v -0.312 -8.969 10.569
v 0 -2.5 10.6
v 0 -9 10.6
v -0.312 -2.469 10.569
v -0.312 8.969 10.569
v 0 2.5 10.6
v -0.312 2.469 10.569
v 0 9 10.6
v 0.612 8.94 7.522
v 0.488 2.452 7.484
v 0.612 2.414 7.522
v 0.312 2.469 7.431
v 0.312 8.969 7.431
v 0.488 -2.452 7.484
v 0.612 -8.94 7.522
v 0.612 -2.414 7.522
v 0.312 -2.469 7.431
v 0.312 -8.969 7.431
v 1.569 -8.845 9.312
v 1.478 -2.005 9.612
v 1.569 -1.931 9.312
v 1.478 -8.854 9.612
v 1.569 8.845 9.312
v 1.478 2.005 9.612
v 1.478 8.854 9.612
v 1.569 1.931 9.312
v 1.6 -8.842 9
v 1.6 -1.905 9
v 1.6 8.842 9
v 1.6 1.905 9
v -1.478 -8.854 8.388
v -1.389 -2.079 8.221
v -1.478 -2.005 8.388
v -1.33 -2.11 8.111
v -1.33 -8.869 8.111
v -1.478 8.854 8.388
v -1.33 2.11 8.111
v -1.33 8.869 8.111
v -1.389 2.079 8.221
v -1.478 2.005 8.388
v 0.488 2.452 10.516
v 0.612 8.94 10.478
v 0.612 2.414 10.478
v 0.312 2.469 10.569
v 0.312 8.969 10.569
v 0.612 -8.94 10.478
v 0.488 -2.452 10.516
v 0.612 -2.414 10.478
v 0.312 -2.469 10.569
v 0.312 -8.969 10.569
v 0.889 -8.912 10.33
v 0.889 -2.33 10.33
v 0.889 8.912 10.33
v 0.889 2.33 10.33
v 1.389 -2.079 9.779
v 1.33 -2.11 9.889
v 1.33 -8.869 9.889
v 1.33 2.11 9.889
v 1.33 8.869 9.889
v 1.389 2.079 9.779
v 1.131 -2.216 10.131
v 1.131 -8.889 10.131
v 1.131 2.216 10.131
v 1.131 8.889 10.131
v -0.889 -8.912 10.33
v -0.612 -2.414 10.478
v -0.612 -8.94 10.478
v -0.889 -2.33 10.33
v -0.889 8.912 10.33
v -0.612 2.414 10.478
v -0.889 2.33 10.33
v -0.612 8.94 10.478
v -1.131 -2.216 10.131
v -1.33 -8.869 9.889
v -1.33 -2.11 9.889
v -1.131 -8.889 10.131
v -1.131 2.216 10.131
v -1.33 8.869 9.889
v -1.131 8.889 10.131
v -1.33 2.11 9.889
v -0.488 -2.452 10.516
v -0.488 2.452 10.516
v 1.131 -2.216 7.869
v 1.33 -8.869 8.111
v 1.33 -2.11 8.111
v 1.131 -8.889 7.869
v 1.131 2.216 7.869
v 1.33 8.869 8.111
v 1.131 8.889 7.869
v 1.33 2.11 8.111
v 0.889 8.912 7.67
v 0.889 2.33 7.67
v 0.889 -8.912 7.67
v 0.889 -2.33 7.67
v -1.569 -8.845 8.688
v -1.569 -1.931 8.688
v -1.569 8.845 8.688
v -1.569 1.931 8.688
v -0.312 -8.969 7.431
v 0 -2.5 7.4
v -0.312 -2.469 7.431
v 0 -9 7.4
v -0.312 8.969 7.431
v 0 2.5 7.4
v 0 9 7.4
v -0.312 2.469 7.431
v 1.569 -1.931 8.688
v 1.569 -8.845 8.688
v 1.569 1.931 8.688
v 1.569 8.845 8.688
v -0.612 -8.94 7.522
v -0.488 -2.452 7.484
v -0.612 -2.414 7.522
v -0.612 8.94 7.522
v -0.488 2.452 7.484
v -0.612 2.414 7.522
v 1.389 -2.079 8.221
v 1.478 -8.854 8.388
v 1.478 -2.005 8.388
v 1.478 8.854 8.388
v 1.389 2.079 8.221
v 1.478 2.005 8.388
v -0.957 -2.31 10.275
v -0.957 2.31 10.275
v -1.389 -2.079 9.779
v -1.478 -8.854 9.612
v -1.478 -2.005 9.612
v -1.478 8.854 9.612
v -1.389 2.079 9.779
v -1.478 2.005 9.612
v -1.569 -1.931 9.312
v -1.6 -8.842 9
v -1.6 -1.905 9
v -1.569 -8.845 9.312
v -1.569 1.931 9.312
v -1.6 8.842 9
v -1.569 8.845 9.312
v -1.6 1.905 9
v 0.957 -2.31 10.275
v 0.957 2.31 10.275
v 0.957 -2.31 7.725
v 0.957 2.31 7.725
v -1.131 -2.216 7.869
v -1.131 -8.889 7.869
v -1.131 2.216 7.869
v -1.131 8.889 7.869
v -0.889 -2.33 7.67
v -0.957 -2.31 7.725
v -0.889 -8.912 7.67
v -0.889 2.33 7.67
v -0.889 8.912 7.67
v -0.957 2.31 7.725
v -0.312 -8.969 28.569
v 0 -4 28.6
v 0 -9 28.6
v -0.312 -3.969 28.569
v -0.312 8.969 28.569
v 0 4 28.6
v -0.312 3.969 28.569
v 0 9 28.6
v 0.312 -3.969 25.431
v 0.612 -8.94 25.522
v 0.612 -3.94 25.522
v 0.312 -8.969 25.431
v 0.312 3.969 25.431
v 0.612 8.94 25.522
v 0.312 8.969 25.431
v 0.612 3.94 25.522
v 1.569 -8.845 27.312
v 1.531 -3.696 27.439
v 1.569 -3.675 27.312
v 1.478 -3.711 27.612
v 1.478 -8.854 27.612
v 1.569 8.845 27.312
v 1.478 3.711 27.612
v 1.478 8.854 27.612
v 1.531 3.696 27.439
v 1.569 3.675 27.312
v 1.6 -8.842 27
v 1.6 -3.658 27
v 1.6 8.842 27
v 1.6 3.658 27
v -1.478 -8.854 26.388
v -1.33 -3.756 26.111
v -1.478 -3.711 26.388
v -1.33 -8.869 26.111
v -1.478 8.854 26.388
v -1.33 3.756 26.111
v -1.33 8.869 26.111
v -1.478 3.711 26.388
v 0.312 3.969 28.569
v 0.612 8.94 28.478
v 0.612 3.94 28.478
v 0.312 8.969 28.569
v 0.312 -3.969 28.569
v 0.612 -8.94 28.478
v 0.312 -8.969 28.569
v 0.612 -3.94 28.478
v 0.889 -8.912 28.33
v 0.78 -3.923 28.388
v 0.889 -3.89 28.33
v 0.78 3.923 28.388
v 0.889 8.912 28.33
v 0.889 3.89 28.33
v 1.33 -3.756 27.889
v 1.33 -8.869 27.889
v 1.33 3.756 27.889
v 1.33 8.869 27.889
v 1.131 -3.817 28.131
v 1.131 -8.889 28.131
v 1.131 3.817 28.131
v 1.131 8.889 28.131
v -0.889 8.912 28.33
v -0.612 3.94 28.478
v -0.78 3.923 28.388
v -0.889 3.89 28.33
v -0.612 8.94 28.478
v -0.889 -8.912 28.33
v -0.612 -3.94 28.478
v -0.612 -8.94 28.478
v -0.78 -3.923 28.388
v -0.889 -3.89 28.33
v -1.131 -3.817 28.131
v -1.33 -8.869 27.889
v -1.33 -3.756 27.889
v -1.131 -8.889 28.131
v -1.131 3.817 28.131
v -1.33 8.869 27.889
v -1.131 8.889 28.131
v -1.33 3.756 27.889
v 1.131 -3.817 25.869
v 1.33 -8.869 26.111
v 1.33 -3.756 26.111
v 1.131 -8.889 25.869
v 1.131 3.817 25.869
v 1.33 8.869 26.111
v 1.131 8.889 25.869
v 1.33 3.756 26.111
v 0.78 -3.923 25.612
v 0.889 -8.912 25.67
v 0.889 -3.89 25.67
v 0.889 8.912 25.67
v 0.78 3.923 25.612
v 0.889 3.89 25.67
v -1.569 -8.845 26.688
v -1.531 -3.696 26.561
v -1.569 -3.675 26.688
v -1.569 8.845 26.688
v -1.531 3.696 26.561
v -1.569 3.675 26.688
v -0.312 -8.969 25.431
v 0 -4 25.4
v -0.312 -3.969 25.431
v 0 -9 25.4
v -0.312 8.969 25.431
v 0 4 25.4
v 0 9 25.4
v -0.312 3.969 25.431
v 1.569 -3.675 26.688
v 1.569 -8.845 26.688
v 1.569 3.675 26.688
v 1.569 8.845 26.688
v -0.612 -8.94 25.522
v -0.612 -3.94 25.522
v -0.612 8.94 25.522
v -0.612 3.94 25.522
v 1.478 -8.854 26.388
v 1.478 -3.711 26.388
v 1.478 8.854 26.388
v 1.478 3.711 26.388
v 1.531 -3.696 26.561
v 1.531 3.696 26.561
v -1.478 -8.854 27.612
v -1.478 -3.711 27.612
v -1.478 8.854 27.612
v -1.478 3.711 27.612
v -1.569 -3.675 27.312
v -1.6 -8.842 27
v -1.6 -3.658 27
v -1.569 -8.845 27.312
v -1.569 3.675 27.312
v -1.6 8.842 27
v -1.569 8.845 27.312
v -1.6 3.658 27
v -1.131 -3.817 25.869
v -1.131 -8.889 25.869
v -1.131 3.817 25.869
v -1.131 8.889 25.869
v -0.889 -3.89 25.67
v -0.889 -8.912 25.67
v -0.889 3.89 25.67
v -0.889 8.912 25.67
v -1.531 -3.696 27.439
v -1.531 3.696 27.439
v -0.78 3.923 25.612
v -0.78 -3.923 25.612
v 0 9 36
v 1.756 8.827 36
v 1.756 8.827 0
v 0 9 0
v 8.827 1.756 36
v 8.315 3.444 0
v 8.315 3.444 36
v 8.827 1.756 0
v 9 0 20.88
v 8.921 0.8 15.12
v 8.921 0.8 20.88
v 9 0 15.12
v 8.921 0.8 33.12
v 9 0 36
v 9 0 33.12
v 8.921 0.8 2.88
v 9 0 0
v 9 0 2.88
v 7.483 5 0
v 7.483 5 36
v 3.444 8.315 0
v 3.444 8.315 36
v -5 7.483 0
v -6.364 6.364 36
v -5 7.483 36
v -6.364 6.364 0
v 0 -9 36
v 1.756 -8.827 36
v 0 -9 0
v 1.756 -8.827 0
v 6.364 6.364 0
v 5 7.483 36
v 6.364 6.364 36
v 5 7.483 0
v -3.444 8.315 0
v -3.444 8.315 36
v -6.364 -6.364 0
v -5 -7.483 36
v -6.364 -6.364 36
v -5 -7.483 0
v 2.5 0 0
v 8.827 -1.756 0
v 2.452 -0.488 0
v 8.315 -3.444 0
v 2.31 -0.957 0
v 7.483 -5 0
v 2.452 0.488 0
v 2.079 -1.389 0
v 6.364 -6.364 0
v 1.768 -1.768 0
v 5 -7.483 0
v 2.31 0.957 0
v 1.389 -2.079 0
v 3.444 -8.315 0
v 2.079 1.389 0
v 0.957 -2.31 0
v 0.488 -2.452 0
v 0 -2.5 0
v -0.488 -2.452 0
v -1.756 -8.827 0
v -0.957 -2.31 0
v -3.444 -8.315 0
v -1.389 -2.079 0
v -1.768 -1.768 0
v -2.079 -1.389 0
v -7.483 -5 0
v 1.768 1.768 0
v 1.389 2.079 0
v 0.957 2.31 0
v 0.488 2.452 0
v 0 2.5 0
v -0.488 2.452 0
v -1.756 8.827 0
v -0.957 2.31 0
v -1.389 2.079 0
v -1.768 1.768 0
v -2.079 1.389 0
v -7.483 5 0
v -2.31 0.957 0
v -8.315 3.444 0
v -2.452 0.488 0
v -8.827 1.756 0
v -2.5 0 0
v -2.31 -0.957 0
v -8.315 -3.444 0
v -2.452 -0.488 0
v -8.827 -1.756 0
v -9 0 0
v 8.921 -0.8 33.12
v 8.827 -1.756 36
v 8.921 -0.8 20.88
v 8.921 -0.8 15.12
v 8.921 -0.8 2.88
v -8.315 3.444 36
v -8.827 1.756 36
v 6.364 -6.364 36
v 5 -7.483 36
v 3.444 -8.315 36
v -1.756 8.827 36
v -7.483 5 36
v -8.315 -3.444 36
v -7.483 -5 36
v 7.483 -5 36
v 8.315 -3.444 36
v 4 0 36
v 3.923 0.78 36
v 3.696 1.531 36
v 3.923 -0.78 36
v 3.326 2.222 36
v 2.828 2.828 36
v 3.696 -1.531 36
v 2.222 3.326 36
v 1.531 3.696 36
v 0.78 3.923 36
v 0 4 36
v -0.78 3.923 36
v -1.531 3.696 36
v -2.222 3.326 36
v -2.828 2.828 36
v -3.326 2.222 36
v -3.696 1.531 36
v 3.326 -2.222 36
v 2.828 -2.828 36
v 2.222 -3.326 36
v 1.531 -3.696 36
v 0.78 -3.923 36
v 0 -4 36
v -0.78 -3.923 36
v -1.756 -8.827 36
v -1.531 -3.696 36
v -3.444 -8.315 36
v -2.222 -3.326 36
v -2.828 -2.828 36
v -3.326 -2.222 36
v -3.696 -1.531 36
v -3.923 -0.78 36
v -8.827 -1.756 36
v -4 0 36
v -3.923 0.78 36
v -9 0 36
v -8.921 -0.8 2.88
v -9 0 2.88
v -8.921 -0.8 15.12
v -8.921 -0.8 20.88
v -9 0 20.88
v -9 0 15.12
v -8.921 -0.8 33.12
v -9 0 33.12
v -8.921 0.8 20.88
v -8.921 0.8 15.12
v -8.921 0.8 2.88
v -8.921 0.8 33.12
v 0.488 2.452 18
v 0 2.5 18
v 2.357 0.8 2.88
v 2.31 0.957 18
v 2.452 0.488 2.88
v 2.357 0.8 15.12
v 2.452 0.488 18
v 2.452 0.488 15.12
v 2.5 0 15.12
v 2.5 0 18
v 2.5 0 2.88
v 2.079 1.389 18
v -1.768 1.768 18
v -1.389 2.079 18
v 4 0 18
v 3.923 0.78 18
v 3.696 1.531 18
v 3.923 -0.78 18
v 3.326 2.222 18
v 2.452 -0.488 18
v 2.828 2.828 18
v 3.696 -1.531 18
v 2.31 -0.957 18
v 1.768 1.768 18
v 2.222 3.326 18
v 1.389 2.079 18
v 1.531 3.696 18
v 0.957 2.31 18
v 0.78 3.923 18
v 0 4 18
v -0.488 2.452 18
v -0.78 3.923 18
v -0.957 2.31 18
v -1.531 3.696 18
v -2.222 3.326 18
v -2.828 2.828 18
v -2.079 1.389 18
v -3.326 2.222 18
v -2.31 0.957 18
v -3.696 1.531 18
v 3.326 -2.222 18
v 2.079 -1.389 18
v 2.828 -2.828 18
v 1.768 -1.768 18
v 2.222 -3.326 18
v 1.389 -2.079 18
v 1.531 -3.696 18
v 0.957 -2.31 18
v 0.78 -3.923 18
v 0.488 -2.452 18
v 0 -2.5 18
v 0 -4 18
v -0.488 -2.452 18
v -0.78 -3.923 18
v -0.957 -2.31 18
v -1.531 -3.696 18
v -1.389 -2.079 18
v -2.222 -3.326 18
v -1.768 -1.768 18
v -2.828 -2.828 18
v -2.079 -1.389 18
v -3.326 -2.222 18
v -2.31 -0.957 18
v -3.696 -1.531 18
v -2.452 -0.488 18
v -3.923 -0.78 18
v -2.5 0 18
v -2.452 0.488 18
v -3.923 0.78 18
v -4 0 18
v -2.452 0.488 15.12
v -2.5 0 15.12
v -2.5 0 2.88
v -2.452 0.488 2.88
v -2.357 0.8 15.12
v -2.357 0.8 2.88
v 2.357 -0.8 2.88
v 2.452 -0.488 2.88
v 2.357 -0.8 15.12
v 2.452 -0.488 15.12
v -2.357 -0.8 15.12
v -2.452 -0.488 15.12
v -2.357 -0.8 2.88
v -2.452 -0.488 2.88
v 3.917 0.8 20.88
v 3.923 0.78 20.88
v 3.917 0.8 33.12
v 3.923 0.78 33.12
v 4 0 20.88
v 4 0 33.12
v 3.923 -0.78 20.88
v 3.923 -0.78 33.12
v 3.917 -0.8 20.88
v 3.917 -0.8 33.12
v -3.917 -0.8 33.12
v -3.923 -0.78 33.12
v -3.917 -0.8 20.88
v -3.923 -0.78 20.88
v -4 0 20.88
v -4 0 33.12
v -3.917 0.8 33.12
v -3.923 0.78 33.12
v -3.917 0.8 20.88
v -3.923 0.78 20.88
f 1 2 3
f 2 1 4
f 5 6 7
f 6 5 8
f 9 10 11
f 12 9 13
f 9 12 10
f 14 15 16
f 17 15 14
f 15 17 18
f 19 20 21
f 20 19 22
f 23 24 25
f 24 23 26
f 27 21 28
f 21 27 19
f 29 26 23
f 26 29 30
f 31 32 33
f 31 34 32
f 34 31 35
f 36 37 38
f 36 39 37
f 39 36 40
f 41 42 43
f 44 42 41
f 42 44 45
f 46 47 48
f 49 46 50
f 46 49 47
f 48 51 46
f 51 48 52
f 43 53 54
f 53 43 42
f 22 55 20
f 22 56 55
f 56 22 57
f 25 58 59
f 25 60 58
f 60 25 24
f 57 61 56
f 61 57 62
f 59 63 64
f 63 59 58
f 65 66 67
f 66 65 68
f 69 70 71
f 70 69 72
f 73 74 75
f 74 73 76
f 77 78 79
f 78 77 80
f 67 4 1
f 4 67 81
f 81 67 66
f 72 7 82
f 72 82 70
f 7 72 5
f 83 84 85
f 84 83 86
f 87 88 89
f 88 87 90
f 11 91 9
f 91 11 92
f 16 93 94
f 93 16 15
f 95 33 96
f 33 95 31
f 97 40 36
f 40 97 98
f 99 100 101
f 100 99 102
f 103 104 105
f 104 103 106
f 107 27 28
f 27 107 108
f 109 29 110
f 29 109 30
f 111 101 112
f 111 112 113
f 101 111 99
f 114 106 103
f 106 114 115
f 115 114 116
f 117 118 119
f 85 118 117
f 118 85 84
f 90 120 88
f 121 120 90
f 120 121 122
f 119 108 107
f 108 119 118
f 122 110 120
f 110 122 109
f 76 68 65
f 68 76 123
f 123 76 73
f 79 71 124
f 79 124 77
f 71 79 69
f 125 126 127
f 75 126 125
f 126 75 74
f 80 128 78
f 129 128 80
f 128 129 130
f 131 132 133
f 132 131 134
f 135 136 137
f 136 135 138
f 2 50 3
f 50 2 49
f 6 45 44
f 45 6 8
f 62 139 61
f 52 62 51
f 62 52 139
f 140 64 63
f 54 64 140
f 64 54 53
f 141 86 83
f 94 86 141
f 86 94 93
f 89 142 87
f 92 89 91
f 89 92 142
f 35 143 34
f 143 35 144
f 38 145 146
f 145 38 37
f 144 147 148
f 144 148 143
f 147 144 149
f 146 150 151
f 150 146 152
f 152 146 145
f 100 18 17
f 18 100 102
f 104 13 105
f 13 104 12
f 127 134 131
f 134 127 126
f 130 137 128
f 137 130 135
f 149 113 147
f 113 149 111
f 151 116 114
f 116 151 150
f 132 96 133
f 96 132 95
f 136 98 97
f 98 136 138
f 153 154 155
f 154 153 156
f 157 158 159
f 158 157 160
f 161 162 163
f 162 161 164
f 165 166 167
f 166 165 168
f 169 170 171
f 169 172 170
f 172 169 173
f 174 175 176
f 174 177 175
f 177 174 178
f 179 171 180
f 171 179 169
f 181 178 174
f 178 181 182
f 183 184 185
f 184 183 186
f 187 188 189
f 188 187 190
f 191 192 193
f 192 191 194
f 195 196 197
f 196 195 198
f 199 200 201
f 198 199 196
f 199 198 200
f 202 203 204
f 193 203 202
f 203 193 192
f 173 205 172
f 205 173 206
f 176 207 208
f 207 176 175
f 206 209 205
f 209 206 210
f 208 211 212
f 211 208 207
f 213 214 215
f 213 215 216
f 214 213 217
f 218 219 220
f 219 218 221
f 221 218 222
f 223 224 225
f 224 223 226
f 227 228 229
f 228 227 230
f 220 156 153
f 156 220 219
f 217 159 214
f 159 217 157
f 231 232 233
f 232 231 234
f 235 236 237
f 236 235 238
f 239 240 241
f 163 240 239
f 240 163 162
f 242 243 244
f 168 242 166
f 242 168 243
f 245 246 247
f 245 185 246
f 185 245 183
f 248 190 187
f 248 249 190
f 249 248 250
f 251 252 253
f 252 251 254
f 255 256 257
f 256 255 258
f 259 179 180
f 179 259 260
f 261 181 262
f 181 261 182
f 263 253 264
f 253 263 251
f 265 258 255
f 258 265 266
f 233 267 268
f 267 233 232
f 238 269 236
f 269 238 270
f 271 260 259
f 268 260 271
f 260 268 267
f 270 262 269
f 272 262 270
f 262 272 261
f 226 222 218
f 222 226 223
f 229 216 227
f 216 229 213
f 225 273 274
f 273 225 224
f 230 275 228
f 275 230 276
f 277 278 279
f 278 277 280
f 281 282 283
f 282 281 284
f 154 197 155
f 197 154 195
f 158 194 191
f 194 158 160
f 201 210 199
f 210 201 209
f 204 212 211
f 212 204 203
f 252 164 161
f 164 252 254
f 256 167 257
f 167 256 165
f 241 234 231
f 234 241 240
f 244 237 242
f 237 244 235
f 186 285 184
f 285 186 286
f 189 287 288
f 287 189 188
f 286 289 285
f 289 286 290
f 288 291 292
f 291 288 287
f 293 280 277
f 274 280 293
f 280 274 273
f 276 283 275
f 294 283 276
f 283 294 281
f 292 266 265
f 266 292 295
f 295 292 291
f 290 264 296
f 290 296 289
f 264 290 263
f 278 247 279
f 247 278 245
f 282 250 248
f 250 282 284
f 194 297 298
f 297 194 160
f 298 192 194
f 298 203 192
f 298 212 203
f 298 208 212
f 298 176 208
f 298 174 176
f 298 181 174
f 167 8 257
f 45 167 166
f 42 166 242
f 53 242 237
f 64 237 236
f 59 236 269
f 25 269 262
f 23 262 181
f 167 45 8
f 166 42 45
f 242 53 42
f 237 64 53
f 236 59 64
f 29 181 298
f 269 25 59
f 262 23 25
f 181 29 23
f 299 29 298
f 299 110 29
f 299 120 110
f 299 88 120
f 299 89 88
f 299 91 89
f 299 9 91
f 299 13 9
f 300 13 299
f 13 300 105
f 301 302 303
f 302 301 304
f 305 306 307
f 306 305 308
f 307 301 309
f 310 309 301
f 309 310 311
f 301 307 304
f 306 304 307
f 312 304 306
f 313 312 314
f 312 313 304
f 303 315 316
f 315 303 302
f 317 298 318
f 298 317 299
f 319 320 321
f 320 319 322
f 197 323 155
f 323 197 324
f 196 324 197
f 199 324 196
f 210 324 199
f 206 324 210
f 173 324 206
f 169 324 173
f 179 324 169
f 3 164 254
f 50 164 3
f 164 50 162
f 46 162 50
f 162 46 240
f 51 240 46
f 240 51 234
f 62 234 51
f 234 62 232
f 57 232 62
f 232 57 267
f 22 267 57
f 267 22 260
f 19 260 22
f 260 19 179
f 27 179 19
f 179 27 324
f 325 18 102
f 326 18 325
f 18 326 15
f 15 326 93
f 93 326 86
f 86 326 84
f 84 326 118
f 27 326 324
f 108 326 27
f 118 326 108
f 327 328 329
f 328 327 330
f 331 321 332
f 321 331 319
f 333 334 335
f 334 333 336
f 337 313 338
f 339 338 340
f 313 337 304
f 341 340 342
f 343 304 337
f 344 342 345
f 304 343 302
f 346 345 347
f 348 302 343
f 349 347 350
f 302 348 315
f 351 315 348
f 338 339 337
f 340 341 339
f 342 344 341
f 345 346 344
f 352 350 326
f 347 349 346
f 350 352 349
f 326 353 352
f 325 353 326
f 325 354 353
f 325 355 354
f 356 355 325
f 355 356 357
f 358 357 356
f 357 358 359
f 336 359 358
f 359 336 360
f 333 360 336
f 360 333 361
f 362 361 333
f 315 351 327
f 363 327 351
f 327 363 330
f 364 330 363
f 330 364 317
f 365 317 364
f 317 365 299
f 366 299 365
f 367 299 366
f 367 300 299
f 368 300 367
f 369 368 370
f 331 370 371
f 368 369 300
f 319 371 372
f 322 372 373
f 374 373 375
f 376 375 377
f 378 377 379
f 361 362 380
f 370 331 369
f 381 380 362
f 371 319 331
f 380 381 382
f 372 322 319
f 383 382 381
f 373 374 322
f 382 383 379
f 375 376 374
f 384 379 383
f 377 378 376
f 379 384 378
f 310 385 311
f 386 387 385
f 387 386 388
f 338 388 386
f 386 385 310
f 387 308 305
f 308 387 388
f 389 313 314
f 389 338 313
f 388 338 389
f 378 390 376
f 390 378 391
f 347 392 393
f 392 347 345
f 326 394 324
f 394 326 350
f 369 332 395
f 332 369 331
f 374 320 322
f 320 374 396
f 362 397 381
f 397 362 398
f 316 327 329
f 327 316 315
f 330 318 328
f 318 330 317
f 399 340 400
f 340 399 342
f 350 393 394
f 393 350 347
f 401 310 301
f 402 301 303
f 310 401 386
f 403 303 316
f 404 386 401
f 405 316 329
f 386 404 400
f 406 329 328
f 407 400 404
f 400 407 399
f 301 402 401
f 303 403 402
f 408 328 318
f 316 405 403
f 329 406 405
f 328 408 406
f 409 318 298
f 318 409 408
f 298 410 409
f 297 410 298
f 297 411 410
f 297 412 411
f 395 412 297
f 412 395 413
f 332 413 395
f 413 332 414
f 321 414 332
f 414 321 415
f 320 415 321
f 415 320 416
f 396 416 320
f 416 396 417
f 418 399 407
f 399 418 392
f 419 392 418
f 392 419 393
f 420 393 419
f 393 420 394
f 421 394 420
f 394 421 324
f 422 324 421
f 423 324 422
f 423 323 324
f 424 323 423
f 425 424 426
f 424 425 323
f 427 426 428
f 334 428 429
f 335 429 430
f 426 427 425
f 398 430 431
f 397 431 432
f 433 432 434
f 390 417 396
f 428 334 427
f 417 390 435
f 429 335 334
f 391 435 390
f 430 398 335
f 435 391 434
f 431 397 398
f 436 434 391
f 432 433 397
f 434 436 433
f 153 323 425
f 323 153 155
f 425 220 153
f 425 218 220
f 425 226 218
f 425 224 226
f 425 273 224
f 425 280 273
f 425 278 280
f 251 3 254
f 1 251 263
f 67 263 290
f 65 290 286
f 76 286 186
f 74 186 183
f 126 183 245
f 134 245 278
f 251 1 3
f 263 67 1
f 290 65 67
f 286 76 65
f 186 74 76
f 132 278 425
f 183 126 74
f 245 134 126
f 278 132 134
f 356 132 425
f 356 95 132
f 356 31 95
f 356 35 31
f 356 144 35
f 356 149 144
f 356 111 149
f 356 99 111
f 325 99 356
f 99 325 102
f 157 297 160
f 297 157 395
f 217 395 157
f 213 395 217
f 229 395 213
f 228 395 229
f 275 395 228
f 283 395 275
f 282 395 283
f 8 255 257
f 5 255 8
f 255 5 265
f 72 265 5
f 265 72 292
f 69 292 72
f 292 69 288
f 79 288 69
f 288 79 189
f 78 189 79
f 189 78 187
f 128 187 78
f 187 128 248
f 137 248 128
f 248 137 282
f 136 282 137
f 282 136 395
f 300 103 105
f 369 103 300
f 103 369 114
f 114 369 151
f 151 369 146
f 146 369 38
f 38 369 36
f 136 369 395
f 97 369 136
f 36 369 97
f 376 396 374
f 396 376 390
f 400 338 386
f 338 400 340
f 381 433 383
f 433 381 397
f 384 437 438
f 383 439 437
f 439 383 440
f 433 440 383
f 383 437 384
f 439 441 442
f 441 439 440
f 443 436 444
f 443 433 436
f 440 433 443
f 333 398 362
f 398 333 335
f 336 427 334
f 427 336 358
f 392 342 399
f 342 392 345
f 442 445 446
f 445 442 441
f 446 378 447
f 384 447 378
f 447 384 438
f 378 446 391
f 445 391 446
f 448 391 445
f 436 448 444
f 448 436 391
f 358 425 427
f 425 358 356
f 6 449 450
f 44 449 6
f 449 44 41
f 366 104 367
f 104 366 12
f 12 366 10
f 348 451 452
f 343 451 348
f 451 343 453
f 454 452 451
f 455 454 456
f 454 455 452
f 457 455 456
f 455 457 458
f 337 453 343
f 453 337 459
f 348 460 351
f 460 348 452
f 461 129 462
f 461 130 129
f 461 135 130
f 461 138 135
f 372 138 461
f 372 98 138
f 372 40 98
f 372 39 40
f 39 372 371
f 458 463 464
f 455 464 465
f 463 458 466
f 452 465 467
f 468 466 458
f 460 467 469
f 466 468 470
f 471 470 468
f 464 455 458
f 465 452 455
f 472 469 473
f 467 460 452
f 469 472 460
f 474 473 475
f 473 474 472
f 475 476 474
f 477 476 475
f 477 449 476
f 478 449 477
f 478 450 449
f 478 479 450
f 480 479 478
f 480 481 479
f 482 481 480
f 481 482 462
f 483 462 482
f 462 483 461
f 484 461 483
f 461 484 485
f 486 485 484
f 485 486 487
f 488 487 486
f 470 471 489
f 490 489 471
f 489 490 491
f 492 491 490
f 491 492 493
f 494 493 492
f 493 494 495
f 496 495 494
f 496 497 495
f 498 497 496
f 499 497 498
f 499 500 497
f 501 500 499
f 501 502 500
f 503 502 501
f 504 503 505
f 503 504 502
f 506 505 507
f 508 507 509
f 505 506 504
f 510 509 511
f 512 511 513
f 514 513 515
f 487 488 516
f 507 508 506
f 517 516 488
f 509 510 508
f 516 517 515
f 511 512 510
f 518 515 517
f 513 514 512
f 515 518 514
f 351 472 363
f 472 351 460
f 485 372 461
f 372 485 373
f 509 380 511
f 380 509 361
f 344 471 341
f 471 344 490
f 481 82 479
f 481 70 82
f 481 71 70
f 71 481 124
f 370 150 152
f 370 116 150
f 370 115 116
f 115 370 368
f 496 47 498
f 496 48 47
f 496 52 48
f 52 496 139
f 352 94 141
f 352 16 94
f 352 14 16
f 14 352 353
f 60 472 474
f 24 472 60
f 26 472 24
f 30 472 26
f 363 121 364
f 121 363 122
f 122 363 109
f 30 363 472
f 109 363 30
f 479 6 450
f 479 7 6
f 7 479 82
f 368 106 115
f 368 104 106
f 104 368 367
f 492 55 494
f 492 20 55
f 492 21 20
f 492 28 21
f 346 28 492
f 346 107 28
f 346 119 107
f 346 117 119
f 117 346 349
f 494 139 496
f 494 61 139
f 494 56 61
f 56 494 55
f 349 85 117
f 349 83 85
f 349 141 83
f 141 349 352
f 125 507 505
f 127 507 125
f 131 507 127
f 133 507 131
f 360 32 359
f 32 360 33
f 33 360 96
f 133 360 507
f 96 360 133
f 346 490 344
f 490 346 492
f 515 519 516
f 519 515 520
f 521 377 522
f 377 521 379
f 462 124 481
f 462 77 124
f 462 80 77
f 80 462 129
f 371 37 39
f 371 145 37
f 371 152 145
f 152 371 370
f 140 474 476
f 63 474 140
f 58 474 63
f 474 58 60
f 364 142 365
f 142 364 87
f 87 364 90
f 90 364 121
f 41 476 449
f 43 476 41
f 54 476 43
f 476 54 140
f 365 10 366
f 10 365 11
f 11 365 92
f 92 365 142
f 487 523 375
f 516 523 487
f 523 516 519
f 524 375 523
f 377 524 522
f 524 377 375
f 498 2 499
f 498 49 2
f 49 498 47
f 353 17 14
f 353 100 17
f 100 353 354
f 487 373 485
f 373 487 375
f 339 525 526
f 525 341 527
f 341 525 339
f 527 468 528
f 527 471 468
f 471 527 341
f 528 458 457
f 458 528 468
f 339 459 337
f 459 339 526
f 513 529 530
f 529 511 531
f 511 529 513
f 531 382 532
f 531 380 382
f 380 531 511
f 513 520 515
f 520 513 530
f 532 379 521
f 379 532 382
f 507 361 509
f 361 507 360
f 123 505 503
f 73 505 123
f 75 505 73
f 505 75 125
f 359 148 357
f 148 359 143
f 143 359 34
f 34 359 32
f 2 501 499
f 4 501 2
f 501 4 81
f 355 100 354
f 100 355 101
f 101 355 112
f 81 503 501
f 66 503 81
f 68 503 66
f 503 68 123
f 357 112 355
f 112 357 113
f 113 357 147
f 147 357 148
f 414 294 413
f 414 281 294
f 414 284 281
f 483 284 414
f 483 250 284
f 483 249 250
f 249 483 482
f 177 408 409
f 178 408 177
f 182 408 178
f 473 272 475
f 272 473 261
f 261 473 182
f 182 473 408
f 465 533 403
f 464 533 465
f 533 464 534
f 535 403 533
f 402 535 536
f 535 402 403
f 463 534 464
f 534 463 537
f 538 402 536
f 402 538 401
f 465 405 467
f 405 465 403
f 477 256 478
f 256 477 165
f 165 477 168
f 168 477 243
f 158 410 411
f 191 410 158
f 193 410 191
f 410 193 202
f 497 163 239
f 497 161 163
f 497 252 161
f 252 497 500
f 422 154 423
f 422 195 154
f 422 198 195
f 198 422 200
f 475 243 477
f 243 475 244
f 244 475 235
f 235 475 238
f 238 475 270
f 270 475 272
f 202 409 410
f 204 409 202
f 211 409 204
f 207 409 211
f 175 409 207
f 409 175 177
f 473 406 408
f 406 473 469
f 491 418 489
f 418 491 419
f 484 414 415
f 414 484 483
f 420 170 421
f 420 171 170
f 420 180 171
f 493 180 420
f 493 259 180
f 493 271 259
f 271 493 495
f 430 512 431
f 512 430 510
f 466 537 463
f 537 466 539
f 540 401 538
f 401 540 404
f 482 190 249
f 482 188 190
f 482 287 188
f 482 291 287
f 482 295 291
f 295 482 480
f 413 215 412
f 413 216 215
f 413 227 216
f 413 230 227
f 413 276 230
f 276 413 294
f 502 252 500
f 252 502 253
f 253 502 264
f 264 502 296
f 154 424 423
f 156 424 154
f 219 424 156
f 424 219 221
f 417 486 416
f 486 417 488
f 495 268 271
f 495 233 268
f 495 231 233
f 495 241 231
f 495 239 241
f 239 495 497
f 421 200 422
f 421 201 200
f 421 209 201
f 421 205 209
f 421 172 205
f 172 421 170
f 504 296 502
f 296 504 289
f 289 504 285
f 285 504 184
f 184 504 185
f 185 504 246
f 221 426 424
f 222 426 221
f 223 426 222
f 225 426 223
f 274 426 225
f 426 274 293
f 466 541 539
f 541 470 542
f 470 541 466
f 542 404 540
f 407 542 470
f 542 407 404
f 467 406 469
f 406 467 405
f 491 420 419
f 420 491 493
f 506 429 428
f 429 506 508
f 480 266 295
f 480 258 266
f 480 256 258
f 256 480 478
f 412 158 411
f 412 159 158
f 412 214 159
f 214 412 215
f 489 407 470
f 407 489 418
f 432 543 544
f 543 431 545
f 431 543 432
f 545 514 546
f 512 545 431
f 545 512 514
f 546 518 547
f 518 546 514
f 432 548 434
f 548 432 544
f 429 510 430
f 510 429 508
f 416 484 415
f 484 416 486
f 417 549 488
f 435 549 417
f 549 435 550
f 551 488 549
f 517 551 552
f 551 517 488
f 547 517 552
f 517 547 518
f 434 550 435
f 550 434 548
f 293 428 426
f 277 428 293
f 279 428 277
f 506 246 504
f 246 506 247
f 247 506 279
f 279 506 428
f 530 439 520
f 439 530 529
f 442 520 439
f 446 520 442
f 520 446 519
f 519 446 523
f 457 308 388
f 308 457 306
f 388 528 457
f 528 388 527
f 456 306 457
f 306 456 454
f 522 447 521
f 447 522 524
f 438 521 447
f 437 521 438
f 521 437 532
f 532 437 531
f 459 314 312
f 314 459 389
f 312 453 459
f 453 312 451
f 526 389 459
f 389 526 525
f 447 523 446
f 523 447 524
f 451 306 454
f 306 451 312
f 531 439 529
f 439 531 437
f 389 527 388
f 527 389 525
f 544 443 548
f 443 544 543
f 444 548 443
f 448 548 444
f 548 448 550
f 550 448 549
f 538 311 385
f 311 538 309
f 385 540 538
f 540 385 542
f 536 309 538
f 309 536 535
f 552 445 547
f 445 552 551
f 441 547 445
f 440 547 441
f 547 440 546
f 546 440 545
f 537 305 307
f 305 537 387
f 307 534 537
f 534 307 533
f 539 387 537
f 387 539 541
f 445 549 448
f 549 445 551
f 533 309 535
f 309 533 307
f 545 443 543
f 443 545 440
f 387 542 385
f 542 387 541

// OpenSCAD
$fn = 32;
// Split shaft coupler 5 mm to 8 mm.

bore_a = 5;
bore_b = 8;
length = 36;
outer_d = 18;
slot_w = 1.6;

difference() {
    cylinder(h = length, d = outer_d);
    translate([0, 0, -1]) cylinder(h = length / 2 + 1, d = bore_a);
    translate([0, 0, length / 2]) cylinder(h = length / 2 + 1, d = bore_b);
    translate([-outer_d / 2 - 1, -slot_w / 2, length * 0.08])
        cube([outer_d + 2, slot_w, length * 0.34]);
    translate([-outer_d / 2 - 1, -slot_w / 2, length * 0.58])
        cube([outer_d + 2, slot_w, length * 0.34]);
    for (z = [length * 0.25, length * 0.75])
        translate([0, outer_d / 2 + 1, z]) rotate([90, 0, 0])
            cylinder(h = outer_d + 2, d = 3.2);
}
